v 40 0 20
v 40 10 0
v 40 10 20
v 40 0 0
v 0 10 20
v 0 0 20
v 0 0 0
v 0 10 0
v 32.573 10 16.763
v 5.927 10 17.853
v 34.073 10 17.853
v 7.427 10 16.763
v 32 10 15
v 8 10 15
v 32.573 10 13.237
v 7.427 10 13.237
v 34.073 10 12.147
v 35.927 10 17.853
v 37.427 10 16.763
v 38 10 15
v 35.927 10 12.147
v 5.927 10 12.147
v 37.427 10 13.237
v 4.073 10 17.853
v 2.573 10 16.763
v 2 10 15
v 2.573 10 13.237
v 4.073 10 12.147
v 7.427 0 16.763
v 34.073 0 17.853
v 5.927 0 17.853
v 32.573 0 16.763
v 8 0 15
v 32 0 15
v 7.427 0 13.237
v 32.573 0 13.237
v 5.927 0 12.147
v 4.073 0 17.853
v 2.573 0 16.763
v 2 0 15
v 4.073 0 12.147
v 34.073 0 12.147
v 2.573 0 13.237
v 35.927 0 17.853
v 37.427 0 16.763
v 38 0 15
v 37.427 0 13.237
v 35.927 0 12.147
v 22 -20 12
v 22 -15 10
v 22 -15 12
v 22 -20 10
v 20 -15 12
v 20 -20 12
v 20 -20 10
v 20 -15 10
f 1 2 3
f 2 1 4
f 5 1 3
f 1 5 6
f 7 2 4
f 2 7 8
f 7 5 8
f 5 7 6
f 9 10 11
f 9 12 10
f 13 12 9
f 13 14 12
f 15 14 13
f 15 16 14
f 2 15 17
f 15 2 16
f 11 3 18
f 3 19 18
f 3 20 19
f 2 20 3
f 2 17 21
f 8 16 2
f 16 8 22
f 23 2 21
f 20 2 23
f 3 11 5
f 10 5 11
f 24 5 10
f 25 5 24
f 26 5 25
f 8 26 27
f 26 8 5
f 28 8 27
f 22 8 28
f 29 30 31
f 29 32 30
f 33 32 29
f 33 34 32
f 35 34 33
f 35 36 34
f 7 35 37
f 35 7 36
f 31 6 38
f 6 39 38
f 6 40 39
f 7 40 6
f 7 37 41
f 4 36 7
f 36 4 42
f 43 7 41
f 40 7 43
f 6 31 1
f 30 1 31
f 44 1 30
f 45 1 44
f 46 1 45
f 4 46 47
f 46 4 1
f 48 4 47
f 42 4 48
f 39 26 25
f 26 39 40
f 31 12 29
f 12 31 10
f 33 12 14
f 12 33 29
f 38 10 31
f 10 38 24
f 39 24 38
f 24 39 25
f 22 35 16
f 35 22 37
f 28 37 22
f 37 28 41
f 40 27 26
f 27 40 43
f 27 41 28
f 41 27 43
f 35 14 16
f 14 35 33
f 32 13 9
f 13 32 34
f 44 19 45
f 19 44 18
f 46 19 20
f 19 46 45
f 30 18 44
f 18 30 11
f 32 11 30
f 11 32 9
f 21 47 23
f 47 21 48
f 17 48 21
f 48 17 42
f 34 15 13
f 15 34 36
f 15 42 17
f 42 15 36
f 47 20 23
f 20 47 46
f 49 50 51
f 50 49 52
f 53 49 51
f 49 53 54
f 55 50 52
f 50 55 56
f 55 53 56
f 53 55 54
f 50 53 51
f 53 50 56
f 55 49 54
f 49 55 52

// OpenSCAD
difference(){
    cube([40,10,20]);
    translate([5,10,15])
    rotate([90,0,0])
        cylinder(h=11, r=3);
    translate([35,10,15])
    rotate([90,0,0])
        cylinder(h=11, r=3);
}
translate([20,-20,10])
cube([2,5,2]);
